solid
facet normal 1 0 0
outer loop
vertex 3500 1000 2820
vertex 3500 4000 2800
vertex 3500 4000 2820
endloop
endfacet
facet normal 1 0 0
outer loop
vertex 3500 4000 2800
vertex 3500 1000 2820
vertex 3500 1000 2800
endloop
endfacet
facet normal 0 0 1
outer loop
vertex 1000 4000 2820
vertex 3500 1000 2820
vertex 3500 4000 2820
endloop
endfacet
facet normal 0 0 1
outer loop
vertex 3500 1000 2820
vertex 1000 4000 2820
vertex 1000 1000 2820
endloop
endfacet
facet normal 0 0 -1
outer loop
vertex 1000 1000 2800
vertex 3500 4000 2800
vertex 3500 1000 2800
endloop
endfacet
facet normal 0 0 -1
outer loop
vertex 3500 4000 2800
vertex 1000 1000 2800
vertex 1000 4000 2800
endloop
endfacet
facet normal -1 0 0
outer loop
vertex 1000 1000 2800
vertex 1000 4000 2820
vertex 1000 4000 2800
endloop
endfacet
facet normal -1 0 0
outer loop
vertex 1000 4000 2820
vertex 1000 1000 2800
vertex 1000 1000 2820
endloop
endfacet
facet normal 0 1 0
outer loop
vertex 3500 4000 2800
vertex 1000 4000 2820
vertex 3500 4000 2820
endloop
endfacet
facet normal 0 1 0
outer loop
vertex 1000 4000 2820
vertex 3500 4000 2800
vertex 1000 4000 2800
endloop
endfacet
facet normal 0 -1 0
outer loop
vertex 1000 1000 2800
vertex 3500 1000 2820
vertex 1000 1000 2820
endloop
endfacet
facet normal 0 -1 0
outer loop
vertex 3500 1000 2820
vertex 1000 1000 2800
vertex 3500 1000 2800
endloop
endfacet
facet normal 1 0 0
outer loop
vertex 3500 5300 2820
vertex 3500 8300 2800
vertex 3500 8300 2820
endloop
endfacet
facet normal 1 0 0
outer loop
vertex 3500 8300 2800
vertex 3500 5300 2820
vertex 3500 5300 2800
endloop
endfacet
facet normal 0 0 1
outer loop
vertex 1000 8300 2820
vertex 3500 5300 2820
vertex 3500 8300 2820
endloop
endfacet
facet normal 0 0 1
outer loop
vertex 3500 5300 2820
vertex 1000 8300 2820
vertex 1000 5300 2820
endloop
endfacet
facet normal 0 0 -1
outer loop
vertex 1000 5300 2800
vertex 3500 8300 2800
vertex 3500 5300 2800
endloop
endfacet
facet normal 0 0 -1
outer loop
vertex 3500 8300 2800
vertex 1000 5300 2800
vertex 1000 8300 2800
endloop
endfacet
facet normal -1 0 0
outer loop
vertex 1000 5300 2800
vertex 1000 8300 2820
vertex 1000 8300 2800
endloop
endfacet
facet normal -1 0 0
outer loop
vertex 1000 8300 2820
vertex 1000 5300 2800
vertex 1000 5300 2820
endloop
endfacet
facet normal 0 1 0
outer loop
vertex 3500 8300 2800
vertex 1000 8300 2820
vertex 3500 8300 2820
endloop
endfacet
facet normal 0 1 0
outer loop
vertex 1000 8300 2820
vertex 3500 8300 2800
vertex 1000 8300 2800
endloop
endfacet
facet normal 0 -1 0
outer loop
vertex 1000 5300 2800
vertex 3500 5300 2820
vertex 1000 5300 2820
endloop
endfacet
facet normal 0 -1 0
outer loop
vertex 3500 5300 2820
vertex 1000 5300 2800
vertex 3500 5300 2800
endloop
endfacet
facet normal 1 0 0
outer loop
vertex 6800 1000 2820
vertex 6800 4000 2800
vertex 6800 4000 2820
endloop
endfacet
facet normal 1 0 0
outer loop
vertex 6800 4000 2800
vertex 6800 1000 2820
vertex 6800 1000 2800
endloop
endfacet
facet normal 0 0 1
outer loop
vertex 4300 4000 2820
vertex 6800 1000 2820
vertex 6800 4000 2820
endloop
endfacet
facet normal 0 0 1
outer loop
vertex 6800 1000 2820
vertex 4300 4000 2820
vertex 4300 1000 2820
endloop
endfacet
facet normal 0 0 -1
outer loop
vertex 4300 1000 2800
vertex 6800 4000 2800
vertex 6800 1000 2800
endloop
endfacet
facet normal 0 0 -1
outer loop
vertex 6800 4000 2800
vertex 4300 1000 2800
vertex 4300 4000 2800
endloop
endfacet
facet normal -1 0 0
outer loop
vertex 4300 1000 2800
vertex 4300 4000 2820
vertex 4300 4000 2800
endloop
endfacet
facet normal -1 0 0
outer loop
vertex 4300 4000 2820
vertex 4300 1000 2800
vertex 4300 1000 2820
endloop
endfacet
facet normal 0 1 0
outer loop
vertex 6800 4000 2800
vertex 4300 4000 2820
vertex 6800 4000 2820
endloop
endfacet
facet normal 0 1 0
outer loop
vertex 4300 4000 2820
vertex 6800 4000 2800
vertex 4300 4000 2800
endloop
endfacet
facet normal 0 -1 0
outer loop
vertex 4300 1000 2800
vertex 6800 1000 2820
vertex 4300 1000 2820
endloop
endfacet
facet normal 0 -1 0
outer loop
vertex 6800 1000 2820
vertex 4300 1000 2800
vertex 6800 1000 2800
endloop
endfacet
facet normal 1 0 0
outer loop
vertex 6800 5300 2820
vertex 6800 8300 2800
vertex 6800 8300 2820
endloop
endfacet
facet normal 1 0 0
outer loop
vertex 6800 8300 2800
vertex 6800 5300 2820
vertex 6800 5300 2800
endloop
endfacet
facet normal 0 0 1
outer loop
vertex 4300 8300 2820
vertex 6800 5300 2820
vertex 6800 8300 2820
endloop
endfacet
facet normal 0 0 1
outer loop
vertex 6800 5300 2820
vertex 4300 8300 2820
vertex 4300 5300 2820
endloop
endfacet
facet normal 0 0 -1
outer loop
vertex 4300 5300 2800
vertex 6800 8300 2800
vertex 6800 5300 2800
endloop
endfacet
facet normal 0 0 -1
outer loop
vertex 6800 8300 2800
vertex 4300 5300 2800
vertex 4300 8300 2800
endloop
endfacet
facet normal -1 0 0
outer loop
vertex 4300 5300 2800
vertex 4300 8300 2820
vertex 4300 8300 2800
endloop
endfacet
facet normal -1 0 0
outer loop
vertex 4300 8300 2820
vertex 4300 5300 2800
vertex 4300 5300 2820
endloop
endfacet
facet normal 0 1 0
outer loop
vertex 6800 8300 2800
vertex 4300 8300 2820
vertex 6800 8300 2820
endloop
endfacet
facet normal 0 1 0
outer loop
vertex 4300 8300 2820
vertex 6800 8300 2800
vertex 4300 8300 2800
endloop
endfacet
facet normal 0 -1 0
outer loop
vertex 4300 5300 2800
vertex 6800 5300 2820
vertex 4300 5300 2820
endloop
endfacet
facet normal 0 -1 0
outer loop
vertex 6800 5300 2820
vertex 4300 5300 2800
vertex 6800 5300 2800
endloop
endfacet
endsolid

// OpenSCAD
// roof

rx = 2500;
ry = 3000;
rz = 20;
color_r = "White";
rxo = 1000;
ryo = 1000;
rzo = 2800;
rxo_s = rxo+3300;
ryo_s = ryo+4300;

translate([rxo, ryo, rzo])
    color(color_r)
    cube([rx, ry, rz]);

translate([rxo, ryo_s, rzo])
    color(color_r)
    cube([rx, ry, rz]);
    
translate([rxo_s, ryo, rzo])
    color(color_r)
    cube([rx, ry, rz]);
    
translate([rxo_s, ryo_s, rzo])
    color(color_r)
    cube([rx, ry, rz]);
